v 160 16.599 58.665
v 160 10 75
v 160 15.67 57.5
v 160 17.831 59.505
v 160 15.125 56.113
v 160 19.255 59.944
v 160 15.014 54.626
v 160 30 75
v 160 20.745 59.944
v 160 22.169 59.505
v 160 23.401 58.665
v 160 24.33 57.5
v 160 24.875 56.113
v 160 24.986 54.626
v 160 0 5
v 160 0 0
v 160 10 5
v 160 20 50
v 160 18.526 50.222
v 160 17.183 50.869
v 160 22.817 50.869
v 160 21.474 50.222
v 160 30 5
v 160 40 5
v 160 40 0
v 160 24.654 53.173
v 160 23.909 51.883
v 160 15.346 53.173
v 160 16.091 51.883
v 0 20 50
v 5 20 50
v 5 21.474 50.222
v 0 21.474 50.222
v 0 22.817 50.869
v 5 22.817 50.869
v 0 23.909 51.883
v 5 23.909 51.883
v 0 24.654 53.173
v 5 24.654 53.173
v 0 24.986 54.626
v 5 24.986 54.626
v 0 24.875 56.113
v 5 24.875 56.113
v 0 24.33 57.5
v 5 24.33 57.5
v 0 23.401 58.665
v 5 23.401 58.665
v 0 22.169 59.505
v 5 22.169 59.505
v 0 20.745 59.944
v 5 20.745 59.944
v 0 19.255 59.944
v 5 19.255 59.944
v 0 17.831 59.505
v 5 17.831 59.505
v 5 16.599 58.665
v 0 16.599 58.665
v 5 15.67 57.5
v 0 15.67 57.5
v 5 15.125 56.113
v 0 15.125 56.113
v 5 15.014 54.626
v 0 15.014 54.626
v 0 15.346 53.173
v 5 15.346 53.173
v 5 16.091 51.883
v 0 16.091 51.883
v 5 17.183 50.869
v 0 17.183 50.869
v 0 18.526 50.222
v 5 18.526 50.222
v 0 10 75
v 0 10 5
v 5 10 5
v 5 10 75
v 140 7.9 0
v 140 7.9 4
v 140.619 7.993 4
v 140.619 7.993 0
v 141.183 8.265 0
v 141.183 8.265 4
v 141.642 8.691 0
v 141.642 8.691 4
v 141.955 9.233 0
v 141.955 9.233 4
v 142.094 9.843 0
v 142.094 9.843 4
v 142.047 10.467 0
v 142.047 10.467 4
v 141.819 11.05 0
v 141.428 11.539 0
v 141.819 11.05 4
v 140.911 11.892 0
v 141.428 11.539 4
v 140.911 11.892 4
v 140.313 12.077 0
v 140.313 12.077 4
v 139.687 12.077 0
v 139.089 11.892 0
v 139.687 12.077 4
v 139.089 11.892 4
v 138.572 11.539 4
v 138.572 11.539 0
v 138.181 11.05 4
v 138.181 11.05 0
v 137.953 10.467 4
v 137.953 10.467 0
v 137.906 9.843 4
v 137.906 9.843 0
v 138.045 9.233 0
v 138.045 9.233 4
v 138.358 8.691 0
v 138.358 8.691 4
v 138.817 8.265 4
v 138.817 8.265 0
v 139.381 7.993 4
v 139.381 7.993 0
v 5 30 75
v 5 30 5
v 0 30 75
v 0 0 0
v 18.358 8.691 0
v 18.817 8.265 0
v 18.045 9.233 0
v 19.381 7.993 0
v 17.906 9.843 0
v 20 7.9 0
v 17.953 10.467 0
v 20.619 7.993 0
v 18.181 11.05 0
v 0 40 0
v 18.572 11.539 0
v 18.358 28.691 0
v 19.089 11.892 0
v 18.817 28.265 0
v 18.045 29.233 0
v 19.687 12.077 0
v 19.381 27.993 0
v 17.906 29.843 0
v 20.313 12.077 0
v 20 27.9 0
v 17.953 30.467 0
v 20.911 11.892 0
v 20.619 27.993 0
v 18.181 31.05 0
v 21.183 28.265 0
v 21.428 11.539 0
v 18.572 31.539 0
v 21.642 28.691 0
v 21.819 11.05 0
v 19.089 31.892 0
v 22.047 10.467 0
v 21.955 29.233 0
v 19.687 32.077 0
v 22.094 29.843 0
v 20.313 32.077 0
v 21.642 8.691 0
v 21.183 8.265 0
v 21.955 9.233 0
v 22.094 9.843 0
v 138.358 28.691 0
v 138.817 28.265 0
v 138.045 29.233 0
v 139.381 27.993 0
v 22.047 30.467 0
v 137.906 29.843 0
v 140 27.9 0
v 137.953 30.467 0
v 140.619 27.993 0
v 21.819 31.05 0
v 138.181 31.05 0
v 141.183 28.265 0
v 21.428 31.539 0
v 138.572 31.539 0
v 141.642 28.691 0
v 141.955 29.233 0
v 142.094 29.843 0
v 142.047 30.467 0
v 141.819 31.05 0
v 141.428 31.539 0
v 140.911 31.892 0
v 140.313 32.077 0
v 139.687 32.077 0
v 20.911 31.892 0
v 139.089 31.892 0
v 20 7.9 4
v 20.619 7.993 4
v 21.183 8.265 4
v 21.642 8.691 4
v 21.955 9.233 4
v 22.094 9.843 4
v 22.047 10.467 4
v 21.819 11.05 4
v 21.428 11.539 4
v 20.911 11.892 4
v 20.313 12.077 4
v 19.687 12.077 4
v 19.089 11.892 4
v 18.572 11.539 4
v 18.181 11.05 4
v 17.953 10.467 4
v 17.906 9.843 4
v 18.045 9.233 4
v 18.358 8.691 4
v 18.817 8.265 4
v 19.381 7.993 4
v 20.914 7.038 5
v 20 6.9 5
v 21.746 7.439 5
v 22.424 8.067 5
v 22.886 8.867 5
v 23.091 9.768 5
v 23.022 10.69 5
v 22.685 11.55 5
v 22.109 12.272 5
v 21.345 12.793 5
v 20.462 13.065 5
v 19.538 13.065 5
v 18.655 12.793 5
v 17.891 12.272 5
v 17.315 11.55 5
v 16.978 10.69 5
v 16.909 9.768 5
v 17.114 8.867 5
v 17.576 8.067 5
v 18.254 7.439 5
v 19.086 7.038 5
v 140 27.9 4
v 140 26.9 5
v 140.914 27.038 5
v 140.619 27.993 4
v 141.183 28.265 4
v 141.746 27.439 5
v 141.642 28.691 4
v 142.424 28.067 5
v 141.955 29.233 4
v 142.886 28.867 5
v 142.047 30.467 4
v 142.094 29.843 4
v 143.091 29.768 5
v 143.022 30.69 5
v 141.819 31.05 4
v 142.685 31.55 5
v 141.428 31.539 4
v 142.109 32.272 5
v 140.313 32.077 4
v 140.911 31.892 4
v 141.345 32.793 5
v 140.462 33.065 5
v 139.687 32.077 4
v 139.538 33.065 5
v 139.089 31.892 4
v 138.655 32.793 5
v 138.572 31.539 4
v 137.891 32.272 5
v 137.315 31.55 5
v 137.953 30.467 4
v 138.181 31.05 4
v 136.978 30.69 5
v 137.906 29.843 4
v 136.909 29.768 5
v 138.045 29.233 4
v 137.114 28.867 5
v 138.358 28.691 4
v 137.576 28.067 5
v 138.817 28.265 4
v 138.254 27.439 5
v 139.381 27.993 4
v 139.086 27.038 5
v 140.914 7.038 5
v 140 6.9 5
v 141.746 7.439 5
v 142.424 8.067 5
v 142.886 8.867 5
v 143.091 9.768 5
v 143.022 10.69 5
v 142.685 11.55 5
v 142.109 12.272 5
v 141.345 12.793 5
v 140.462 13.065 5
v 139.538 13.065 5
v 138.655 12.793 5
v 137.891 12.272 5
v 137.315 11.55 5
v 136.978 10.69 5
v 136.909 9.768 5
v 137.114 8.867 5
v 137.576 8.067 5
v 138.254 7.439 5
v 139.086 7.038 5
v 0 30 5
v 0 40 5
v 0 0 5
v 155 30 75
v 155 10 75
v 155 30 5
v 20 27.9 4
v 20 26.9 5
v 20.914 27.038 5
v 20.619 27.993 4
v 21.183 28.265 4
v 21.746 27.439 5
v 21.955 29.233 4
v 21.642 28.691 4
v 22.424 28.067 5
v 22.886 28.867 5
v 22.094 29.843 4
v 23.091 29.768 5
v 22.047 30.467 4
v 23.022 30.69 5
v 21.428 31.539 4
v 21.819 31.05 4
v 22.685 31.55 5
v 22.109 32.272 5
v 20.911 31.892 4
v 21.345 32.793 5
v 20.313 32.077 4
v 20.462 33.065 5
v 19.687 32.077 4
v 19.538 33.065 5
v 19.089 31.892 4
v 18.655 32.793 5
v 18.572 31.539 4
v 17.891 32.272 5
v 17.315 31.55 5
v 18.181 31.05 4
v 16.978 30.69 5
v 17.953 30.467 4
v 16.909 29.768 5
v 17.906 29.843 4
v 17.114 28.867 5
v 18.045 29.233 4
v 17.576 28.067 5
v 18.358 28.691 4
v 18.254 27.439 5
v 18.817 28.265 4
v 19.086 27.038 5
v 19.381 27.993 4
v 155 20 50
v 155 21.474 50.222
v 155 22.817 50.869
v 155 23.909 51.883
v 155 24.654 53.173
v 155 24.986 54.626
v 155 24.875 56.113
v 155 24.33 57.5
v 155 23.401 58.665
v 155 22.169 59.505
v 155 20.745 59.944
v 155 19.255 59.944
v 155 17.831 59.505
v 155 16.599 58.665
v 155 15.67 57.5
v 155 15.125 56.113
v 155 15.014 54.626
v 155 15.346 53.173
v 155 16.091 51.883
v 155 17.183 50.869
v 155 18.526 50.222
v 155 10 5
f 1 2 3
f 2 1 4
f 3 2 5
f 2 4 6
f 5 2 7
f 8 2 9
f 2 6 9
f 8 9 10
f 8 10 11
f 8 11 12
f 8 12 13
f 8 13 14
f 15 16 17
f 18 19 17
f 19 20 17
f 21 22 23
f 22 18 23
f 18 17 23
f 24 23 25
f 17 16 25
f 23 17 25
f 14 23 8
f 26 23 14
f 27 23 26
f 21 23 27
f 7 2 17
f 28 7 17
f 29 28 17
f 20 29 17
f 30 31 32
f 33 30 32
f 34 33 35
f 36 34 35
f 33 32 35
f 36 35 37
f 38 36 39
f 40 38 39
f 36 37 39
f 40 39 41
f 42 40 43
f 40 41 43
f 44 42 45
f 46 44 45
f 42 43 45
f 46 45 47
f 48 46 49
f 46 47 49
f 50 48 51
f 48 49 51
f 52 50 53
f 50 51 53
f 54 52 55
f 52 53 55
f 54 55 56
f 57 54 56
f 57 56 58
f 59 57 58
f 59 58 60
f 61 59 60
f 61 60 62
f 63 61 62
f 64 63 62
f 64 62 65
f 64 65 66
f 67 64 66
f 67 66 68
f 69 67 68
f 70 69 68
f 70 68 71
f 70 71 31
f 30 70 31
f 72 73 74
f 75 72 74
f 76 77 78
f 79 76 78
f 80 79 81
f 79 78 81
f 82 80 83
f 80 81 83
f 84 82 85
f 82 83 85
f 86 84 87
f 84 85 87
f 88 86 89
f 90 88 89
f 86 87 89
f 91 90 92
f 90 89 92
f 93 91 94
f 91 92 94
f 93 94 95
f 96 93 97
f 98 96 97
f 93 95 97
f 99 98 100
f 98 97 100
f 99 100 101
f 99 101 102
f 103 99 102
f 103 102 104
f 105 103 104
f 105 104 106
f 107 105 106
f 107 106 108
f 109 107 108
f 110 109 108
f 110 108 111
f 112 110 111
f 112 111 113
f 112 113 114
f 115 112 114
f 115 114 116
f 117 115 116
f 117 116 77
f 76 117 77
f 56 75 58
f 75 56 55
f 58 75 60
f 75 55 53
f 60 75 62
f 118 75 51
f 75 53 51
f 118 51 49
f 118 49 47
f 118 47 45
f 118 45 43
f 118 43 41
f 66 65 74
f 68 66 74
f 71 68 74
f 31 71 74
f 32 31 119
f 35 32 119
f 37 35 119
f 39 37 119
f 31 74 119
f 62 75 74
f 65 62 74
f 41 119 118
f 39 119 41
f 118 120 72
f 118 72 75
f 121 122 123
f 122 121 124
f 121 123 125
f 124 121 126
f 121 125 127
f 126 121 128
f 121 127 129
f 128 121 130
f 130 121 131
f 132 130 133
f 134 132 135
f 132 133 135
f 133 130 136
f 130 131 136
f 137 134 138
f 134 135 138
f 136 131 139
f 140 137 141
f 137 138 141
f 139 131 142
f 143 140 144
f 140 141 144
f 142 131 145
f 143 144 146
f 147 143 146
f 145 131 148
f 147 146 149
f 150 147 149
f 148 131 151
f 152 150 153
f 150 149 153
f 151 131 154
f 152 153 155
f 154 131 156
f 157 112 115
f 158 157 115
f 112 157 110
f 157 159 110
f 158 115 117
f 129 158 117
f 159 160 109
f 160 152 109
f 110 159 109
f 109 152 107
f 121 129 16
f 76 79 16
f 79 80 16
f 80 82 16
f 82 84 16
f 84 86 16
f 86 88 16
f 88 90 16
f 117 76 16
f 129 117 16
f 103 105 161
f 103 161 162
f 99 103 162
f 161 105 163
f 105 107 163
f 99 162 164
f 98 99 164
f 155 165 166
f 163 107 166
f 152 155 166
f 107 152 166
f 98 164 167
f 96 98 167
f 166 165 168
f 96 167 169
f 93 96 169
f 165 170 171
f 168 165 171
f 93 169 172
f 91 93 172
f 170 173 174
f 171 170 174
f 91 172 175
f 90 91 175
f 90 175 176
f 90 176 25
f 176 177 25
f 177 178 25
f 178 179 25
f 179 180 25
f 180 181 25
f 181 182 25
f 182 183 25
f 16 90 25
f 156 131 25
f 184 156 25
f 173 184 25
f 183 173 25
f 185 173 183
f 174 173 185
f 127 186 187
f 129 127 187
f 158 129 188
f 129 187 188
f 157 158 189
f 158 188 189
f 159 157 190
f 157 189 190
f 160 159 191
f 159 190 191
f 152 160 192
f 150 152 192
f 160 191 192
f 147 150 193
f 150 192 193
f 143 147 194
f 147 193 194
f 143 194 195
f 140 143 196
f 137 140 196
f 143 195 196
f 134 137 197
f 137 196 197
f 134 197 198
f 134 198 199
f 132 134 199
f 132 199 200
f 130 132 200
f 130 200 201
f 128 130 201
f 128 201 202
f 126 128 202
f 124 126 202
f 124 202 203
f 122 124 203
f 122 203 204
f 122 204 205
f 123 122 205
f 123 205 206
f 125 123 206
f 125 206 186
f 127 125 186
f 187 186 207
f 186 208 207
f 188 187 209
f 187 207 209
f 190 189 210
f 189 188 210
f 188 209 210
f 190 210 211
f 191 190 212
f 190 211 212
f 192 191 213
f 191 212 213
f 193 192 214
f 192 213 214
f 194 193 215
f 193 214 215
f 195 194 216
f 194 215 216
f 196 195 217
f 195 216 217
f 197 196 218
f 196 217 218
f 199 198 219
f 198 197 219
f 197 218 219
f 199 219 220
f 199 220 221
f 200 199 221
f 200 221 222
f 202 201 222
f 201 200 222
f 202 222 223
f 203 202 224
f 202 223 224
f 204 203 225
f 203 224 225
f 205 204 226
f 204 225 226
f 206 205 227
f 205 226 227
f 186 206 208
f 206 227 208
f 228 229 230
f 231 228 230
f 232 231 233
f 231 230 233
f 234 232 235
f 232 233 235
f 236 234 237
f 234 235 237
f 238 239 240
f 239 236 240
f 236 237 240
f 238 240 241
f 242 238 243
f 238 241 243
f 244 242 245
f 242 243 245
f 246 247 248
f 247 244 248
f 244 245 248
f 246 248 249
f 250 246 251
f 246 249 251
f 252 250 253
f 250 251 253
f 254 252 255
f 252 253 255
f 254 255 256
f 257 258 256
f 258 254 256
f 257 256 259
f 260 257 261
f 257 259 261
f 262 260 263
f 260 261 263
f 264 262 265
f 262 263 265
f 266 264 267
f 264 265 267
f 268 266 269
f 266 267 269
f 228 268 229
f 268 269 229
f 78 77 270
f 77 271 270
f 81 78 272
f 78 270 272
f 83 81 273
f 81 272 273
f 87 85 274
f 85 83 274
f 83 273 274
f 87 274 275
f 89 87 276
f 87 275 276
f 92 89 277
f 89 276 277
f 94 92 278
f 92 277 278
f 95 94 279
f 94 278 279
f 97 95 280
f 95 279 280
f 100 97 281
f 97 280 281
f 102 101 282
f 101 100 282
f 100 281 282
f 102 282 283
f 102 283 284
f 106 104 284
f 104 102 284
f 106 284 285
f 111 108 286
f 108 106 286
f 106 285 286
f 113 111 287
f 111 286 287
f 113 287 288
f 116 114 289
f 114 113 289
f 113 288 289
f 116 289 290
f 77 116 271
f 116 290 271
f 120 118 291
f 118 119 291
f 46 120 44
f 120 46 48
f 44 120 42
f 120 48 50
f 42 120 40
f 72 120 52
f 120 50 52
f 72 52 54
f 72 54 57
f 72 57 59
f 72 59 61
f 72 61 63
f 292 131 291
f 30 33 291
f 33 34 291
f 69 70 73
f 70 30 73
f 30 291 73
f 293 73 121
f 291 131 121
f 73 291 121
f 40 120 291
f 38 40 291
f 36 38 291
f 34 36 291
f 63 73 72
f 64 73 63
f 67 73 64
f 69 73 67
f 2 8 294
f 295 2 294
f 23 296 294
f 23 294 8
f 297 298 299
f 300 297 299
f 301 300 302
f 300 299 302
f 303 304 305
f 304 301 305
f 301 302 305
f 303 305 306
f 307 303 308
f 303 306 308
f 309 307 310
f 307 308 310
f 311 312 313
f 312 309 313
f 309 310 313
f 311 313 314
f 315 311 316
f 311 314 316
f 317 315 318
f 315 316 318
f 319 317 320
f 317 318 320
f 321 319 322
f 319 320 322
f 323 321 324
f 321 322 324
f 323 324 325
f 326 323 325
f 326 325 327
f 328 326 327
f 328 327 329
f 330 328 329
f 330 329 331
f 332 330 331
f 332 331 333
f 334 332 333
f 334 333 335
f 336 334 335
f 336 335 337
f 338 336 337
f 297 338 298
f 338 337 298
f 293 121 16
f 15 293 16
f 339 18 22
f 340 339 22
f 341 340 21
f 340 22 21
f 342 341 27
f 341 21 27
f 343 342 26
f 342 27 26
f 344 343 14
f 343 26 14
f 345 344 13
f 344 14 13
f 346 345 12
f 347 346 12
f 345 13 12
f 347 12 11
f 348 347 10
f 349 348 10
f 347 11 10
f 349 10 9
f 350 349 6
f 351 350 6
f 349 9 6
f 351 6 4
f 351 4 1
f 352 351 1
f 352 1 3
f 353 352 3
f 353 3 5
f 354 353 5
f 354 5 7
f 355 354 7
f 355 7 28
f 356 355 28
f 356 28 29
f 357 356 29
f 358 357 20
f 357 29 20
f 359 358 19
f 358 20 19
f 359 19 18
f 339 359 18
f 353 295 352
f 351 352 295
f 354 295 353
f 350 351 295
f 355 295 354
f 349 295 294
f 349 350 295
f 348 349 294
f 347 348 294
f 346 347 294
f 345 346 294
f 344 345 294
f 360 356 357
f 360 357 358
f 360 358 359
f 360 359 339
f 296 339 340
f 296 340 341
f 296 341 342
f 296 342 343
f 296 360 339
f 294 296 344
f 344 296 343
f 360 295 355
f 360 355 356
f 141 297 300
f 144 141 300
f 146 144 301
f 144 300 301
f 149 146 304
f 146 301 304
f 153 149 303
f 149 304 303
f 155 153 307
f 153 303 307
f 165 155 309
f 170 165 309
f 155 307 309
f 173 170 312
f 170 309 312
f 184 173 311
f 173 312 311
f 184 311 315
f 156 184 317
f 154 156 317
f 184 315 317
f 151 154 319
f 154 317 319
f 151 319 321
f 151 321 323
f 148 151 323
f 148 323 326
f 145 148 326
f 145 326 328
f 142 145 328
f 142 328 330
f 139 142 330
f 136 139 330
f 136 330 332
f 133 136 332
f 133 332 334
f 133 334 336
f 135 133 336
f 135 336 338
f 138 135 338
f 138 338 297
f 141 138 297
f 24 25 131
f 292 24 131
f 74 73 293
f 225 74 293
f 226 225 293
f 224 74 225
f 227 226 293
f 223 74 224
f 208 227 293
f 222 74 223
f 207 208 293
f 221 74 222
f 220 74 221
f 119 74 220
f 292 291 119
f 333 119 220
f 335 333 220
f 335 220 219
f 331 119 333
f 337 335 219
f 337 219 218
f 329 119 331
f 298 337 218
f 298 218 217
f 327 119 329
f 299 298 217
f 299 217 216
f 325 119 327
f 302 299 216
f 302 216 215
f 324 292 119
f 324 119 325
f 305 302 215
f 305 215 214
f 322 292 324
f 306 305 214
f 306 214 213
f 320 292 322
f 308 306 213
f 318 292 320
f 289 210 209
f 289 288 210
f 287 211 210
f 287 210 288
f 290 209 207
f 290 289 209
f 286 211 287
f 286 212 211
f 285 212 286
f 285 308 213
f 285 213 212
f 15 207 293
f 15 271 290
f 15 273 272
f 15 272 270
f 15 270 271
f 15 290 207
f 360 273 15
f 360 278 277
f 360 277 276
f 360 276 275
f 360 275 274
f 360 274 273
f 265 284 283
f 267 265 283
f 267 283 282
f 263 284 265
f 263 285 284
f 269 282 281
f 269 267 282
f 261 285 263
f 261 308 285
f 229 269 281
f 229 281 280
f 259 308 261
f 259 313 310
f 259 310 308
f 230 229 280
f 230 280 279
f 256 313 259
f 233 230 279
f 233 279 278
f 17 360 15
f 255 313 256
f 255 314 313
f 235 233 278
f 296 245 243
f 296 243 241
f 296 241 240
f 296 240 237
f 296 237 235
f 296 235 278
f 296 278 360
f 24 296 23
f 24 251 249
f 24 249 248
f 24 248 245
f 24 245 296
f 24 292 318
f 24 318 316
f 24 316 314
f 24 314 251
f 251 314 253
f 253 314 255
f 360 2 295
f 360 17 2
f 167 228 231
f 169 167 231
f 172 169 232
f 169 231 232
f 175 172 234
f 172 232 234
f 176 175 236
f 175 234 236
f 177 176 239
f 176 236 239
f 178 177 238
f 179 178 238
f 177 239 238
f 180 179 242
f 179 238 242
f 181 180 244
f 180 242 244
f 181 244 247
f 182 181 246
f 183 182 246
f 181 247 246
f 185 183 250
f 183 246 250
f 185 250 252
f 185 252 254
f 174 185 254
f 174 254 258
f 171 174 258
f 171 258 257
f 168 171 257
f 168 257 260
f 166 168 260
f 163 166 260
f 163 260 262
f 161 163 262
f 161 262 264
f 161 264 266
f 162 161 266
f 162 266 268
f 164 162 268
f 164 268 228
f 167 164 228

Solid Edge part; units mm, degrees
sketch "Sketch1" plane through (0, 0, 0) normal (0, 0, 1) x (1, 0, 0)
  line L0 (160, 0) -> (160, 40)
  line L1 (160, 40) -> (0, 40)
  line L2 (0, 40) -> (0, 0)
  line L3 (0, 0) -> (160, 0)
extrude "Protrusion1" add sketch "Sketch1" along normal blind 5
sketch "Sketch2" plane through (75, 20, 5) normal (0, 0, 1) x (1, 0, 0)
  line L0 (80, 10) -> (85, 10)
  line L1 (85, 10) -> (85, -10)
  line L2 (85, -10) -> (80, -10)
  line L3 (80, -10) -> (80, 10)
  line L4 (-70, -10) -> (-70, 10)
  line L5 (-70, 10) -> (-75, 10)
  line L6 (-75, 10) -> (-75, -10)
  line L7 (-75, -10) -> (-70, -10)
  dimension "D1" = 5
  dimension "D2" = 10
  dimension "D3" = 10
  dimension "D4" = 20
  dimension "D5" = 10
  dimension "D6" = 20
  dimension "D7" = 10
extrude "ExtrudedProtrusion_2" add sketch "Sketch2" along normal blind 70
hole "Bohrung_1" at (20, 30, 5) direction (0, 0, -1) diameter 4.2 end up to next start chamfer 1 start chamfer angle 45
hole "Hole1" at (20, 10, 5) direction (0, 0, -1) diameter 4.2 end up to next start chamfer 1 start chamfer angle 45
hole "Hole2" at (140, 10, 5) direction (0, 0, -1) diameter 4.2 end up to next start chamfer 1 start chamfer angle 45
hole "Hole3" at (140, 30, 5) direction (0, 0, -1) diameter 4.2 end up to next start chamfer 1 start chamfer angle 45
hole "Bohrung_6" at (160, 20, 55) direction (-1, 0, 0) diameter 10 end through all
